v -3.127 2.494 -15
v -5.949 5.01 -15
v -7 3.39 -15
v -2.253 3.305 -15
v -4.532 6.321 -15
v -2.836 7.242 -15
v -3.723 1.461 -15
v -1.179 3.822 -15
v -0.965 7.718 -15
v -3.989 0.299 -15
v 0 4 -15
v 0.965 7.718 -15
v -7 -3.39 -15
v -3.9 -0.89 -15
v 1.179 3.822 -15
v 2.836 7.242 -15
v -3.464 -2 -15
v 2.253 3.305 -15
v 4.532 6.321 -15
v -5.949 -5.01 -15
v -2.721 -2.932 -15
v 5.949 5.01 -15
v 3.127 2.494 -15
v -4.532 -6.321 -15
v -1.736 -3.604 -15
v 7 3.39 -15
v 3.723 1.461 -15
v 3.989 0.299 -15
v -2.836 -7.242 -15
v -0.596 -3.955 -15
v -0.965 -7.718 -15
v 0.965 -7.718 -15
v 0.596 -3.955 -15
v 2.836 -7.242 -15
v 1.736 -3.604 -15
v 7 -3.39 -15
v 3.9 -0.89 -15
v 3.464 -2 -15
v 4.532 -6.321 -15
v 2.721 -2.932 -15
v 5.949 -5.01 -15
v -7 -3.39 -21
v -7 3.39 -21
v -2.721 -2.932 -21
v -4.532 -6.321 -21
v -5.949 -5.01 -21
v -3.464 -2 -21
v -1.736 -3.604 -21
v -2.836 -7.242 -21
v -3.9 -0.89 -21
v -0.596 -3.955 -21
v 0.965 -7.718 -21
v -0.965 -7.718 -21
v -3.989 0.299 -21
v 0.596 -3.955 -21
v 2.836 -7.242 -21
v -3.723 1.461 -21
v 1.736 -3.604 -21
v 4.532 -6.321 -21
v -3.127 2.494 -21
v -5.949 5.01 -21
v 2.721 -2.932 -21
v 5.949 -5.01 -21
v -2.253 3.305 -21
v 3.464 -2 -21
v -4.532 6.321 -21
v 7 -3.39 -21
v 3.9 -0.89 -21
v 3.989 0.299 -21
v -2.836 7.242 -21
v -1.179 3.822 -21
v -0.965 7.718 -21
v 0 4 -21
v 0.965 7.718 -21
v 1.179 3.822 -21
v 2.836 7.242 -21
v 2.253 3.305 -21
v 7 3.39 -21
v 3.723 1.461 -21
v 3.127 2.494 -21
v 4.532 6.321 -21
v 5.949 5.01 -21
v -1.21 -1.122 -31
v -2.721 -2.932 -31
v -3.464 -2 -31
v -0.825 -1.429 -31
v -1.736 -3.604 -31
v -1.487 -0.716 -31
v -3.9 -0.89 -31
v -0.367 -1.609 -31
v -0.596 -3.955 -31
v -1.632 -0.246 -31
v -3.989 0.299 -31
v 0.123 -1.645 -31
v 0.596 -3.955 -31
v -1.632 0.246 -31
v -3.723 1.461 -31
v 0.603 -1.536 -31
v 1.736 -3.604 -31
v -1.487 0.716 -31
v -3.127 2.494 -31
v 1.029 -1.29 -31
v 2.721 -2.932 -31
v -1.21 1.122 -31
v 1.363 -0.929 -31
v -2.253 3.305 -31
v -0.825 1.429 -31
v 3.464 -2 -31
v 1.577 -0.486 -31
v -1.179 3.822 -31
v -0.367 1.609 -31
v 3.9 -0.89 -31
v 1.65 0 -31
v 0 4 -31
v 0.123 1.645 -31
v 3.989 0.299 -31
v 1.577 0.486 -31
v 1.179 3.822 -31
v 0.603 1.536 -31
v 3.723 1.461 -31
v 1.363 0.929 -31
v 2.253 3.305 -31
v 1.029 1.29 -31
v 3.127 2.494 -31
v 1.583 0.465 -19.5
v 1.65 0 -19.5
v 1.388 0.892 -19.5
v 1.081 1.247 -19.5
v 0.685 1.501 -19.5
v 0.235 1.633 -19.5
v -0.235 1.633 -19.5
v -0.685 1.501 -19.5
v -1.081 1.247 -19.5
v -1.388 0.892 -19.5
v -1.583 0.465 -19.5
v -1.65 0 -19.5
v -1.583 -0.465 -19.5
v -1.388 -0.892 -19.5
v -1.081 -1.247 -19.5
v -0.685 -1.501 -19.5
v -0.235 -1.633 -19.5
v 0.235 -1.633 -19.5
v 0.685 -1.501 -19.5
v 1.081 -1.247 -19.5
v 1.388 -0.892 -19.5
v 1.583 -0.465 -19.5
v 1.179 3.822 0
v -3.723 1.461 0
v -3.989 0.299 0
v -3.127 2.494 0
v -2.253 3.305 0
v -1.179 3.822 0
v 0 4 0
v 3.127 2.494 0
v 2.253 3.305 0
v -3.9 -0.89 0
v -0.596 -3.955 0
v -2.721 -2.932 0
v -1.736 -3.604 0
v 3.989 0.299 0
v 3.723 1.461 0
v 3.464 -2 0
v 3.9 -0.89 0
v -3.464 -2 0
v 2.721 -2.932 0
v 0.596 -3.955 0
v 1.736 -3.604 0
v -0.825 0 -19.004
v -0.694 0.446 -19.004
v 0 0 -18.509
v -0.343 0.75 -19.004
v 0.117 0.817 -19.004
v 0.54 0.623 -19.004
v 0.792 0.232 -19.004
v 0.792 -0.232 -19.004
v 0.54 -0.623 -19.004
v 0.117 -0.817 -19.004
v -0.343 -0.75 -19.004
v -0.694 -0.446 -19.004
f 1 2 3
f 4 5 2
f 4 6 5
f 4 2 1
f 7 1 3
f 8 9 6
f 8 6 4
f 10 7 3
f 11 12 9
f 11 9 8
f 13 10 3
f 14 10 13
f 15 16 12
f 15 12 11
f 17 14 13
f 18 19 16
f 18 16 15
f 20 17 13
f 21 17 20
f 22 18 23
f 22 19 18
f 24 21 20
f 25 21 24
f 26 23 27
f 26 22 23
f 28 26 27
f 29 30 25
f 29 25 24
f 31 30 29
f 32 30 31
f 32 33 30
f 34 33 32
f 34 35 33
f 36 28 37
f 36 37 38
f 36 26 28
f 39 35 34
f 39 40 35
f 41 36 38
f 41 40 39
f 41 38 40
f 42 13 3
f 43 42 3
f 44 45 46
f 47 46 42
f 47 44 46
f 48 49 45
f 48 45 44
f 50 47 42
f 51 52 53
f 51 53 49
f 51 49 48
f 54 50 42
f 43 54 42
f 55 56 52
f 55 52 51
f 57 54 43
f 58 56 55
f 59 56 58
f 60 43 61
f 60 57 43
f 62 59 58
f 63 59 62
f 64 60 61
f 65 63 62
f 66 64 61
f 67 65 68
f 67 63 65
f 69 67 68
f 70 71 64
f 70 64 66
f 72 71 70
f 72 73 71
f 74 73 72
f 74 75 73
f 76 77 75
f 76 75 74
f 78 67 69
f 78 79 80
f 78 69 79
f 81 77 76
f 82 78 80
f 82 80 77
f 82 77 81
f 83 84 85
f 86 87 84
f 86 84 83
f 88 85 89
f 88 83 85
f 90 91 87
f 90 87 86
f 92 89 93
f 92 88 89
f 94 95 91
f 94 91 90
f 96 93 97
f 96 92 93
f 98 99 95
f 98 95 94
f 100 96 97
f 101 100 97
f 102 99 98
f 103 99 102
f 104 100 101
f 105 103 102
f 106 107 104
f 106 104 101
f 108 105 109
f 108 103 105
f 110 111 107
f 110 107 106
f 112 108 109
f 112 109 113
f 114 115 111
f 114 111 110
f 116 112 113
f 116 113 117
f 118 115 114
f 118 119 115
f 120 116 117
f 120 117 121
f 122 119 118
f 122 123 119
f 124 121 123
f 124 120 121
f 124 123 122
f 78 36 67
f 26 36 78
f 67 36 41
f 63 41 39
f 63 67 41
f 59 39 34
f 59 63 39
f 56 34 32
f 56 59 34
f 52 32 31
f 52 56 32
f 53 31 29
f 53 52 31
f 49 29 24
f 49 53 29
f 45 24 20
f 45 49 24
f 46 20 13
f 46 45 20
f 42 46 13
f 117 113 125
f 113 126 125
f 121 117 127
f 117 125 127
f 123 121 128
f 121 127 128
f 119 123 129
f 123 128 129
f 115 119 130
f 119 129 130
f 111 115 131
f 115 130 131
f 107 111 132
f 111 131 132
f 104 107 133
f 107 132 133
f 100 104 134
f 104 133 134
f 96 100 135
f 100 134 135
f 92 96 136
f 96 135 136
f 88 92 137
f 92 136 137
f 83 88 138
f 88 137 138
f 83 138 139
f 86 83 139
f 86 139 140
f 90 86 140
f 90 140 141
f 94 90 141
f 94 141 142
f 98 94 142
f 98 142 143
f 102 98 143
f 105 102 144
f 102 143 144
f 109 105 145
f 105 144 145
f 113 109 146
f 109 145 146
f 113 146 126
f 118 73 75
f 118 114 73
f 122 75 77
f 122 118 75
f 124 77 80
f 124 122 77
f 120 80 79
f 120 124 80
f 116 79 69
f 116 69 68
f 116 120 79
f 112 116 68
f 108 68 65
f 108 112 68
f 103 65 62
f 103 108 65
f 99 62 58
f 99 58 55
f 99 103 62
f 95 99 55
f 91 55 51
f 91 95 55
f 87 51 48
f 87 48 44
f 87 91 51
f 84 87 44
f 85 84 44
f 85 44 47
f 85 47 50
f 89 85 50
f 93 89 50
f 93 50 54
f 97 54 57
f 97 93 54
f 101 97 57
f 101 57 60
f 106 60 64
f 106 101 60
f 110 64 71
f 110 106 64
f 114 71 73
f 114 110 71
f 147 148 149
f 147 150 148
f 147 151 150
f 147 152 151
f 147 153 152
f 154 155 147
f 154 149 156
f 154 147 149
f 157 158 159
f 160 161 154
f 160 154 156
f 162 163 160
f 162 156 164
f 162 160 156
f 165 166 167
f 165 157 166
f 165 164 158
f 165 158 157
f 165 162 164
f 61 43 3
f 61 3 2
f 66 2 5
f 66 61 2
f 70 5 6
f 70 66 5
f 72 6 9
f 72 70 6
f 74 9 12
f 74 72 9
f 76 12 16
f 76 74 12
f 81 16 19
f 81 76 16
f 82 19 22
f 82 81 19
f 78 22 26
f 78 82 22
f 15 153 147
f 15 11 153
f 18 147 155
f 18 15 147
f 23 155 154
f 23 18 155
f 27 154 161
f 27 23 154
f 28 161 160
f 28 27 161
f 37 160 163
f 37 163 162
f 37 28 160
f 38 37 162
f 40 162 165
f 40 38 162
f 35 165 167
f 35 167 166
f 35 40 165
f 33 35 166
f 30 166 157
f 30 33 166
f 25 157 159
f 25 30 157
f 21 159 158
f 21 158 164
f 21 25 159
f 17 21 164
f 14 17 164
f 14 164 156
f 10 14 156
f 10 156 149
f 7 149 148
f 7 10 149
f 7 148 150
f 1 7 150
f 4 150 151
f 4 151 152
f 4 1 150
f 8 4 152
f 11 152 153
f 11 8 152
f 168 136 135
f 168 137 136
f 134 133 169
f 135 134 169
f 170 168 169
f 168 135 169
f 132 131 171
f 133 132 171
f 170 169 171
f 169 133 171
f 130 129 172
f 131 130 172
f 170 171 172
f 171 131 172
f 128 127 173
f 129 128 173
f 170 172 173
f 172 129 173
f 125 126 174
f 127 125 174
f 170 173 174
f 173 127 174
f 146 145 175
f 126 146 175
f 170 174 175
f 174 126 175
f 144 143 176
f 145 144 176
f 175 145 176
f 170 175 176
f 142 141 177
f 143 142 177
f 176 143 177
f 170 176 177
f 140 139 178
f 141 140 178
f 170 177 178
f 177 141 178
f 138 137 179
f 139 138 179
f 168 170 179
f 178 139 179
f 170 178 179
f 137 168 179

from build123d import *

# Parameters (mm, degrees)
SKETCH_3_W             = 8
SKETCH_3_H             = 16.823898374
CUT_EXTRUDE_1_DEPTH    = 10
HOLE_WIZARD_M4_1_D     = 3.3
HOLE_WIZARD_M4_1_DEPTH = 11.5
HOLE_WIZARD_M4_1_TIP   = 0.991420021
SKETCH_5_OUTSIDE_W     = 23.696
SKETCH_5_OUTSIDE_H     = 27.696
SKETCH_5_OUTSIDE_R     = 7.77784742
CUT_EXTRUDE_2_DEPTH    = 10


with BuildPart() as part:
    # 草图2 → 旋转1 (revolve)
    with BuildSketch(Plane(origin=(0, 0, 0), x_dir=(0, 0, -1), z_dir=(1, 0, 0))):
        Polygon((0, 0), (0, 4), (15, 4), (15, 9), (21, 9), (21, 4), (31, 4), (31, 0), align=None)
    revolve(axis=Axis((0, 0, 0), (0, 0, -1)))

    # 草图3 → 切除-拉伸1 (cut)
    with BuildSketch(Plane.XY.offset(-15)):
        with Locations((-11, -0.026043186)):
            Rectangle(SKETCH_3_W, SKETCH_3_H)
        with Locations((11, -0.026043186)):
            Rectangle(SKETCH_3_W, SKETCH_3_H)
    extrude(amount=-CUT_EXTRUDE_1_DEPTH, mode=Mode.SUBTRACT)

    # M4 螺纹孔1
    with Locations(Plane(origin=(0, 0, -31), x_dir=(-1, 0, 0), z_dir=(0, 0, -1))):
        with Locations((0, 0)):
            Hole(HOLE_WIZARD_M4_1_D / 2, depth=HOLE_WIZARD_M4_1_DEPTH)
            with Locations((0, 0, -(HOLE_WIZARD_M4_1_DEPTH + HOLE_WIZARD_M4_1_TIP / 2))):  # 118° drill point
                Cone(0, HOLE_WIZARD_M4_1_D / 2, HOLE_WIZARD_M4_1_TIP, mode=Mode.SUBTRACT)

    # 草图5 outside → 切除-拉伸2 (cut)
    with BuildSketch(Plane(origin=(0, 0, -21), x_dir=(-1, 0, 0), z_dir=(0, 0, -1))):
        Rectangle(SKETCH_5_OUTSIDE_W, SKETCH_5_OUTSIDE_H)
        Circle(SKETCH_5_OUTSIDE_R, mode=Mode.SUBTRACT)
    extrude(amount=-CUT_EXTRUDE_2_DEPTH, mode=Mode.SUBTRACT)


solid = part.part
